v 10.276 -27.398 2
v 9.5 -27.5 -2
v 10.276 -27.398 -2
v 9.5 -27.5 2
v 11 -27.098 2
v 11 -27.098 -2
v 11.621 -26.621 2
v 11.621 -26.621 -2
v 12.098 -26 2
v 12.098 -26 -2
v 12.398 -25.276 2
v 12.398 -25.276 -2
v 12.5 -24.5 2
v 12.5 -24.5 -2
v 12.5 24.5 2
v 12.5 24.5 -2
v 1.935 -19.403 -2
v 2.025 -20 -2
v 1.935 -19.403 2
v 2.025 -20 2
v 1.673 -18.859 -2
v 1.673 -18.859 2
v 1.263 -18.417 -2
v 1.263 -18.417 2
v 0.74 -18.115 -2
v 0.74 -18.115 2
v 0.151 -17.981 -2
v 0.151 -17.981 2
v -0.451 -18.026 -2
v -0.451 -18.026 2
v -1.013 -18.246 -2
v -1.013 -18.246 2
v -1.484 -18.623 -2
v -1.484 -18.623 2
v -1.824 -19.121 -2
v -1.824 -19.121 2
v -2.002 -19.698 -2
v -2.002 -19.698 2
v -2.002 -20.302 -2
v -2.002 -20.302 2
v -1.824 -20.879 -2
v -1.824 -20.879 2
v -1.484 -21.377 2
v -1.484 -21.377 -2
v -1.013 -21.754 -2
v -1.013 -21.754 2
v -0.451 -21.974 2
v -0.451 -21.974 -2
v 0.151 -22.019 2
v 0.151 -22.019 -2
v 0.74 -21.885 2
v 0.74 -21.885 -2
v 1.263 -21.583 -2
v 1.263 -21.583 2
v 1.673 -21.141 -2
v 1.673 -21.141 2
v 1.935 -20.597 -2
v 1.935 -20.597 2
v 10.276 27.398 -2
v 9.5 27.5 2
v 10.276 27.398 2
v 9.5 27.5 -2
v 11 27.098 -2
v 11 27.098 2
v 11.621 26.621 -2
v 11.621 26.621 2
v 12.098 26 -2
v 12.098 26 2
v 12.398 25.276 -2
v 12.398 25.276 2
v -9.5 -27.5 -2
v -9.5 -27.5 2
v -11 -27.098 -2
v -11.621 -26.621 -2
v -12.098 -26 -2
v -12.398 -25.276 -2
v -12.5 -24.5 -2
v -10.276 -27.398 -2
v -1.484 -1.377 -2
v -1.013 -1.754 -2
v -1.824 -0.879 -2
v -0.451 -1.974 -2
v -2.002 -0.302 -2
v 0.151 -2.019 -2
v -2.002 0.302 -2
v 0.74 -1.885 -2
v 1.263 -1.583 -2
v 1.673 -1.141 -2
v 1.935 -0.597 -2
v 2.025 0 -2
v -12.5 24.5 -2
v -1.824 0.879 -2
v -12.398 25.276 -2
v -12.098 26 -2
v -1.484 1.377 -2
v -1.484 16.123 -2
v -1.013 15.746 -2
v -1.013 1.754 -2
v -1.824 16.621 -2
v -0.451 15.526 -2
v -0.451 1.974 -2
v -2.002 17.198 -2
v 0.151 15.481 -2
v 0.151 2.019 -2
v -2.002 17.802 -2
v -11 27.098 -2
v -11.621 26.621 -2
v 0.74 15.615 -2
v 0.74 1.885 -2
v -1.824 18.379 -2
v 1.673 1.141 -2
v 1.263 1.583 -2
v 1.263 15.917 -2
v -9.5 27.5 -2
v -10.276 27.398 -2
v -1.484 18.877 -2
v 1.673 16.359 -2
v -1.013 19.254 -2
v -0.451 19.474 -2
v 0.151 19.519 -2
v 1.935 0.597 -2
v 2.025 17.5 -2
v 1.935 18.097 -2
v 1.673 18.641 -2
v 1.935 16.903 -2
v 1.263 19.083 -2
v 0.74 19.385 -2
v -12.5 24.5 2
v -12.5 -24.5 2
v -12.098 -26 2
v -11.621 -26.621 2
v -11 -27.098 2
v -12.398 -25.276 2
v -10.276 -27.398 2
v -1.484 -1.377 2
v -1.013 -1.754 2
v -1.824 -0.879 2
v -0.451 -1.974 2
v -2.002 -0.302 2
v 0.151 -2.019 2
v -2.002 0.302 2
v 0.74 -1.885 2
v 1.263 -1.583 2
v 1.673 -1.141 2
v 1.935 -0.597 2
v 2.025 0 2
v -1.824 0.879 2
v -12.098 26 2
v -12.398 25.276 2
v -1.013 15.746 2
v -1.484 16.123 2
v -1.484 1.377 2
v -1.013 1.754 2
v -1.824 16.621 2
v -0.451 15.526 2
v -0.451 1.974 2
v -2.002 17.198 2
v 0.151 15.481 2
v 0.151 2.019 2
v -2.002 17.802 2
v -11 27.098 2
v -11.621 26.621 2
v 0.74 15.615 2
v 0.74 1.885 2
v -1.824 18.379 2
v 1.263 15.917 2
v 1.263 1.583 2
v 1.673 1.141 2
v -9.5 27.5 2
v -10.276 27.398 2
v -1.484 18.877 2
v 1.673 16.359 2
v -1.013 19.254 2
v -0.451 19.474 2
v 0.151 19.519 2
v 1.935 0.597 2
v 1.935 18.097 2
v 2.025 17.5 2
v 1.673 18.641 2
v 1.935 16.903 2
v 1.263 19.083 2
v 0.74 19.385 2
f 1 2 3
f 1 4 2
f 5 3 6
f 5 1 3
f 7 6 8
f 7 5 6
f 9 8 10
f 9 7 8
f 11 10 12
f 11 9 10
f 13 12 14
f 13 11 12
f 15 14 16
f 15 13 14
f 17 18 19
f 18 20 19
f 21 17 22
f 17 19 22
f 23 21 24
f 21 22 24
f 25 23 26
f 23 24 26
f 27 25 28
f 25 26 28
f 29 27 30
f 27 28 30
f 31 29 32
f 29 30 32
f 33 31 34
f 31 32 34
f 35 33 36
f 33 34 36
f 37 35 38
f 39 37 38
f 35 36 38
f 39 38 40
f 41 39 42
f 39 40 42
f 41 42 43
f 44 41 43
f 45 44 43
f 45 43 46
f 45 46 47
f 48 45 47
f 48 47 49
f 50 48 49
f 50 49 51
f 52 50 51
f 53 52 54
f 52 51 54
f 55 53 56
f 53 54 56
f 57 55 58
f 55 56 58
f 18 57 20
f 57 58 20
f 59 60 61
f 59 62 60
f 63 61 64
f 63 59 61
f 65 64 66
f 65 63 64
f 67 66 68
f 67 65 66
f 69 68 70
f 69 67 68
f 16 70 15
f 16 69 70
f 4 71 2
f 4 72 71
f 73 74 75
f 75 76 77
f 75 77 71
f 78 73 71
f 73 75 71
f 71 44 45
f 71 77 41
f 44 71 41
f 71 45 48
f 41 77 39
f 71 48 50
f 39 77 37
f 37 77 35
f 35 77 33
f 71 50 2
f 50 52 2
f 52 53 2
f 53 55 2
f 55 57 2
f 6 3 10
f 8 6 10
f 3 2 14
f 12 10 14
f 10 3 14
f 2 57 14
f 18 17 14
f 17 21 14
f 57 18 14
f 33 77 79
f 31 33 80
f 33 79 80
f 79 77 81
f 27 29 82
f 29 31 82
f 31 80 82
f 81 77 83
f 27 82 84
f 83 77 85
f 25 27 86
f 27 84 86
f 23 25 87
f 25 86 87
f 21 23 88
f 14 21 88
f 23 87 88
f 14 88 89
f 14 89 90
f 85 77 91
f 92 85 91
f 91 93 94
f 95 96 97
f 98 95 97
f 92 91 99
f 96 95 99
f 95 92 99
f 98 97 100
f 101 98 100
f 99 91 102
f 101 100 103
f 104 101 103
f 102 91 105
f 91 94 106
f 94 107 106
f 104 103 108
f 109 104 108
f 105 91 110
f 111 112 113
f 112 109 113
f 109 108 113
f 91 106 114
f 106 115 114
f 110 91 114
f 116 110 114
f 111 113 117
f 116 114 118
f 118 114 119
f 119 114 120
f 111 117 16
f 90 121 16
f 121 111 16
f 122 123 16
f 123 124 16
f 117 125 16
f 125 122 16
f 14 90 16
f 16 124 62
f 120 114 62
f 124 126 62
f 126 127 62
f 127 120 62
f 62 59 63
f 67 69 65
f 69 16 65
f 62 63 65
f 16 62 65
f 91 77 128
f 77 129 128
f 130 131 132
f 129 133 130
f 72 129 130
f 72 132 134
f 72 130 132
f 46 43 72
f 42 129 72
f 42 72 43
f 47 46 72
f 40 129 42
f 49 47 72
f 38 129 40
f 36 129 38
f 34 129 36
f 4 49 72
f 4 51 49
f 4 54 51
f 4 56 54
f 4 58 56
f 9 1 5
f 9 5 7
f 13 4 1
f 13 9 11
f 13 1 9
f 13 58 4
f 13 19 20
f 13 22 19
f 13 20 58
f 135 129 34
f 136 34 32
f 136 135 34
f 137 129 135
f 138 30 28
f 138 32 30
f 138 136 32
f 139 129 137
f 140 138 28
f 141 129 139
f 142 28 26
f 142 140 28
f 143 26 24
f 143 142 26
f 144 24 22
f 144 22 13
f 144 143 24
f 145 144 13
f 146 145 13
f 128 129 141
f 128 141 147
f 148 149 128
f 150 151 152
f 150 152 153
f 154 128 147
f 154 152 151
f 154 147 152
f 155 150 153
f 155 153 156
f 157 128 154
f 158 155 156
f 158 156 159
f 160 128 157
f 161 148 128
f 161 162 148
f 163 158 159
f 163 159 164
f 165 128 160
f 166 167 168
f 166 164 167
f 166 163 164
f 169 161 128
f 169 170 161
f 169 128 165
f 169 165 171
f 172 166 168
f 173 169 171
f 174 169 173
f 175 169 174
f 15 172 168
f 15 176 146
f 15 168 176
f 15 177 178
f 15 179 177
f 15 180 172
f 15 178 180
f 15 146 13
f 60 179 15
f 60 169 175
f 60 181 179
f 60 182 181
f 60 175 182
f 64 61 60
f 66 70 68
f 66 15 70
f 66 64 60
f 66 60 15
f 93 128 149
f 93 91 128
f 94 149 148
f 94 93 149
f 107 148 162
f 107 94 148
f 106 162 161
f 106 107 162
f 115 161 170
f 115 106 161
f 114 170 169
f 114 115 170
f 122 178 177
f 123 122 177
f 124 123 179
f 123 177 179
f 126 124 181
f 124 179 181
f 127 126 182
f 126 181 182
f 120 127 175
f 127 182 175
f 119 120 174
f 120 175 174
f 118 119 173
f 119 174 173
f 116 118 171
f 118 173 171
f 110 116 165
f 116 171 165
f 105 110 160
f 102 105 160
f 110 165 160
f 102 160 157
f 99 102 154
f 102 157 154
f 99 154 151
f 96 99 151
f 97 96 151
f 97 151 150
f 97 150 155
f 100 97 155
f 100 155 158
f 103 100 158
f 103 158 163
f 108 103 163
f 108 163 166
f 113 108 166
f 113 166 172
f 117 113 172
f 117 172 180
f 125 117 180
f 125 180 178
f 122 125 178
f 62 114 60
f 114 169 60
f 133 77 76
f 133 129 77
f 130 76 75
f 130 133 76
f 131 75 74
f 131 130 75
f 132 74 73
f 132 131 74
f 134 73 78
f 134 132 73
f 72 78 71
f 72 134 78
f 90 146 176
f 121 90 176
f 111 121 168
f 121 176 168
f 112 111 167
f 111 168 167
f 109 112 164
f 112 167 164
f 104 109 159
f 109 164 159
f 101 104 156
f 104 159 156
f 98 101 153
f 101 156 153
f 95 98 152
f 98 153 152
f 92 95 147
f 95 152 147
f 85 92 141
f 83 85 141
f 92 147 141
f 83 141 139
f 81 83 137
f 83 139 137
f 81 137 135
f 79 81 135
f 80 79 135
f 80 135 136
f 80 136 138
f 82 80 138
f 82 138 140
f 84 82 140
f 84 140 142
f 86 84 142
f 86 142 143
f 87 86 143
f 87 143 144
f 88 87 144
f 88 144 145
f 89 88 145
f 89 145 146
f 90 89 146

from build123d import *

# Parameters (mm, degrees)
SKETCH_1_W          = 25
SKETCH_1_H          = 55
EXTRUDE_1_DEPTH     = 2
SKETCH_2_R          = 2.025
CUT_EXTRUDE_1_DEPTH = 12
FILLET_1_R          = 3


with BuildPart() as part:
    # 草图1 → 凸台-拉伸1 (new body, symmetric)
    with BuildSketch(Plane.XY):
        Rectangle(SKETCH_1_W, SKETCH_1_H)
    extrude(amount=EXTRUDE_1_DEPTH, both=True)

    # 草图2 → 切除-拉伸1 (cut, symmetric)
    with BuildSketch(Plane.XY.offset(2)):
        with Locations((0, 17.5)):
            Circle(SKETCH_2_R)
        Circle(SKETCH_2_R)
        with Locations((0, -20)):
            Circle(SKETCH_2_R)
    extrude(amount=CUT_EXTRUDE_1_DEPTH, both=True, mode=Mode.SUBTRACT)

    # 圆角1
    fillet_1_edges = [part.edges().sort_by_distance(p)[0] for p in [
        (12.5, -27.5, 0),
        (-12.5, -27.5, 0),
        (-12.5, 27.5, 0),
        (12.5, 27.5, 0),
    ]]
    fillet(fillet_1_edges, radius=FILLET_1_R)


solid = part.part
